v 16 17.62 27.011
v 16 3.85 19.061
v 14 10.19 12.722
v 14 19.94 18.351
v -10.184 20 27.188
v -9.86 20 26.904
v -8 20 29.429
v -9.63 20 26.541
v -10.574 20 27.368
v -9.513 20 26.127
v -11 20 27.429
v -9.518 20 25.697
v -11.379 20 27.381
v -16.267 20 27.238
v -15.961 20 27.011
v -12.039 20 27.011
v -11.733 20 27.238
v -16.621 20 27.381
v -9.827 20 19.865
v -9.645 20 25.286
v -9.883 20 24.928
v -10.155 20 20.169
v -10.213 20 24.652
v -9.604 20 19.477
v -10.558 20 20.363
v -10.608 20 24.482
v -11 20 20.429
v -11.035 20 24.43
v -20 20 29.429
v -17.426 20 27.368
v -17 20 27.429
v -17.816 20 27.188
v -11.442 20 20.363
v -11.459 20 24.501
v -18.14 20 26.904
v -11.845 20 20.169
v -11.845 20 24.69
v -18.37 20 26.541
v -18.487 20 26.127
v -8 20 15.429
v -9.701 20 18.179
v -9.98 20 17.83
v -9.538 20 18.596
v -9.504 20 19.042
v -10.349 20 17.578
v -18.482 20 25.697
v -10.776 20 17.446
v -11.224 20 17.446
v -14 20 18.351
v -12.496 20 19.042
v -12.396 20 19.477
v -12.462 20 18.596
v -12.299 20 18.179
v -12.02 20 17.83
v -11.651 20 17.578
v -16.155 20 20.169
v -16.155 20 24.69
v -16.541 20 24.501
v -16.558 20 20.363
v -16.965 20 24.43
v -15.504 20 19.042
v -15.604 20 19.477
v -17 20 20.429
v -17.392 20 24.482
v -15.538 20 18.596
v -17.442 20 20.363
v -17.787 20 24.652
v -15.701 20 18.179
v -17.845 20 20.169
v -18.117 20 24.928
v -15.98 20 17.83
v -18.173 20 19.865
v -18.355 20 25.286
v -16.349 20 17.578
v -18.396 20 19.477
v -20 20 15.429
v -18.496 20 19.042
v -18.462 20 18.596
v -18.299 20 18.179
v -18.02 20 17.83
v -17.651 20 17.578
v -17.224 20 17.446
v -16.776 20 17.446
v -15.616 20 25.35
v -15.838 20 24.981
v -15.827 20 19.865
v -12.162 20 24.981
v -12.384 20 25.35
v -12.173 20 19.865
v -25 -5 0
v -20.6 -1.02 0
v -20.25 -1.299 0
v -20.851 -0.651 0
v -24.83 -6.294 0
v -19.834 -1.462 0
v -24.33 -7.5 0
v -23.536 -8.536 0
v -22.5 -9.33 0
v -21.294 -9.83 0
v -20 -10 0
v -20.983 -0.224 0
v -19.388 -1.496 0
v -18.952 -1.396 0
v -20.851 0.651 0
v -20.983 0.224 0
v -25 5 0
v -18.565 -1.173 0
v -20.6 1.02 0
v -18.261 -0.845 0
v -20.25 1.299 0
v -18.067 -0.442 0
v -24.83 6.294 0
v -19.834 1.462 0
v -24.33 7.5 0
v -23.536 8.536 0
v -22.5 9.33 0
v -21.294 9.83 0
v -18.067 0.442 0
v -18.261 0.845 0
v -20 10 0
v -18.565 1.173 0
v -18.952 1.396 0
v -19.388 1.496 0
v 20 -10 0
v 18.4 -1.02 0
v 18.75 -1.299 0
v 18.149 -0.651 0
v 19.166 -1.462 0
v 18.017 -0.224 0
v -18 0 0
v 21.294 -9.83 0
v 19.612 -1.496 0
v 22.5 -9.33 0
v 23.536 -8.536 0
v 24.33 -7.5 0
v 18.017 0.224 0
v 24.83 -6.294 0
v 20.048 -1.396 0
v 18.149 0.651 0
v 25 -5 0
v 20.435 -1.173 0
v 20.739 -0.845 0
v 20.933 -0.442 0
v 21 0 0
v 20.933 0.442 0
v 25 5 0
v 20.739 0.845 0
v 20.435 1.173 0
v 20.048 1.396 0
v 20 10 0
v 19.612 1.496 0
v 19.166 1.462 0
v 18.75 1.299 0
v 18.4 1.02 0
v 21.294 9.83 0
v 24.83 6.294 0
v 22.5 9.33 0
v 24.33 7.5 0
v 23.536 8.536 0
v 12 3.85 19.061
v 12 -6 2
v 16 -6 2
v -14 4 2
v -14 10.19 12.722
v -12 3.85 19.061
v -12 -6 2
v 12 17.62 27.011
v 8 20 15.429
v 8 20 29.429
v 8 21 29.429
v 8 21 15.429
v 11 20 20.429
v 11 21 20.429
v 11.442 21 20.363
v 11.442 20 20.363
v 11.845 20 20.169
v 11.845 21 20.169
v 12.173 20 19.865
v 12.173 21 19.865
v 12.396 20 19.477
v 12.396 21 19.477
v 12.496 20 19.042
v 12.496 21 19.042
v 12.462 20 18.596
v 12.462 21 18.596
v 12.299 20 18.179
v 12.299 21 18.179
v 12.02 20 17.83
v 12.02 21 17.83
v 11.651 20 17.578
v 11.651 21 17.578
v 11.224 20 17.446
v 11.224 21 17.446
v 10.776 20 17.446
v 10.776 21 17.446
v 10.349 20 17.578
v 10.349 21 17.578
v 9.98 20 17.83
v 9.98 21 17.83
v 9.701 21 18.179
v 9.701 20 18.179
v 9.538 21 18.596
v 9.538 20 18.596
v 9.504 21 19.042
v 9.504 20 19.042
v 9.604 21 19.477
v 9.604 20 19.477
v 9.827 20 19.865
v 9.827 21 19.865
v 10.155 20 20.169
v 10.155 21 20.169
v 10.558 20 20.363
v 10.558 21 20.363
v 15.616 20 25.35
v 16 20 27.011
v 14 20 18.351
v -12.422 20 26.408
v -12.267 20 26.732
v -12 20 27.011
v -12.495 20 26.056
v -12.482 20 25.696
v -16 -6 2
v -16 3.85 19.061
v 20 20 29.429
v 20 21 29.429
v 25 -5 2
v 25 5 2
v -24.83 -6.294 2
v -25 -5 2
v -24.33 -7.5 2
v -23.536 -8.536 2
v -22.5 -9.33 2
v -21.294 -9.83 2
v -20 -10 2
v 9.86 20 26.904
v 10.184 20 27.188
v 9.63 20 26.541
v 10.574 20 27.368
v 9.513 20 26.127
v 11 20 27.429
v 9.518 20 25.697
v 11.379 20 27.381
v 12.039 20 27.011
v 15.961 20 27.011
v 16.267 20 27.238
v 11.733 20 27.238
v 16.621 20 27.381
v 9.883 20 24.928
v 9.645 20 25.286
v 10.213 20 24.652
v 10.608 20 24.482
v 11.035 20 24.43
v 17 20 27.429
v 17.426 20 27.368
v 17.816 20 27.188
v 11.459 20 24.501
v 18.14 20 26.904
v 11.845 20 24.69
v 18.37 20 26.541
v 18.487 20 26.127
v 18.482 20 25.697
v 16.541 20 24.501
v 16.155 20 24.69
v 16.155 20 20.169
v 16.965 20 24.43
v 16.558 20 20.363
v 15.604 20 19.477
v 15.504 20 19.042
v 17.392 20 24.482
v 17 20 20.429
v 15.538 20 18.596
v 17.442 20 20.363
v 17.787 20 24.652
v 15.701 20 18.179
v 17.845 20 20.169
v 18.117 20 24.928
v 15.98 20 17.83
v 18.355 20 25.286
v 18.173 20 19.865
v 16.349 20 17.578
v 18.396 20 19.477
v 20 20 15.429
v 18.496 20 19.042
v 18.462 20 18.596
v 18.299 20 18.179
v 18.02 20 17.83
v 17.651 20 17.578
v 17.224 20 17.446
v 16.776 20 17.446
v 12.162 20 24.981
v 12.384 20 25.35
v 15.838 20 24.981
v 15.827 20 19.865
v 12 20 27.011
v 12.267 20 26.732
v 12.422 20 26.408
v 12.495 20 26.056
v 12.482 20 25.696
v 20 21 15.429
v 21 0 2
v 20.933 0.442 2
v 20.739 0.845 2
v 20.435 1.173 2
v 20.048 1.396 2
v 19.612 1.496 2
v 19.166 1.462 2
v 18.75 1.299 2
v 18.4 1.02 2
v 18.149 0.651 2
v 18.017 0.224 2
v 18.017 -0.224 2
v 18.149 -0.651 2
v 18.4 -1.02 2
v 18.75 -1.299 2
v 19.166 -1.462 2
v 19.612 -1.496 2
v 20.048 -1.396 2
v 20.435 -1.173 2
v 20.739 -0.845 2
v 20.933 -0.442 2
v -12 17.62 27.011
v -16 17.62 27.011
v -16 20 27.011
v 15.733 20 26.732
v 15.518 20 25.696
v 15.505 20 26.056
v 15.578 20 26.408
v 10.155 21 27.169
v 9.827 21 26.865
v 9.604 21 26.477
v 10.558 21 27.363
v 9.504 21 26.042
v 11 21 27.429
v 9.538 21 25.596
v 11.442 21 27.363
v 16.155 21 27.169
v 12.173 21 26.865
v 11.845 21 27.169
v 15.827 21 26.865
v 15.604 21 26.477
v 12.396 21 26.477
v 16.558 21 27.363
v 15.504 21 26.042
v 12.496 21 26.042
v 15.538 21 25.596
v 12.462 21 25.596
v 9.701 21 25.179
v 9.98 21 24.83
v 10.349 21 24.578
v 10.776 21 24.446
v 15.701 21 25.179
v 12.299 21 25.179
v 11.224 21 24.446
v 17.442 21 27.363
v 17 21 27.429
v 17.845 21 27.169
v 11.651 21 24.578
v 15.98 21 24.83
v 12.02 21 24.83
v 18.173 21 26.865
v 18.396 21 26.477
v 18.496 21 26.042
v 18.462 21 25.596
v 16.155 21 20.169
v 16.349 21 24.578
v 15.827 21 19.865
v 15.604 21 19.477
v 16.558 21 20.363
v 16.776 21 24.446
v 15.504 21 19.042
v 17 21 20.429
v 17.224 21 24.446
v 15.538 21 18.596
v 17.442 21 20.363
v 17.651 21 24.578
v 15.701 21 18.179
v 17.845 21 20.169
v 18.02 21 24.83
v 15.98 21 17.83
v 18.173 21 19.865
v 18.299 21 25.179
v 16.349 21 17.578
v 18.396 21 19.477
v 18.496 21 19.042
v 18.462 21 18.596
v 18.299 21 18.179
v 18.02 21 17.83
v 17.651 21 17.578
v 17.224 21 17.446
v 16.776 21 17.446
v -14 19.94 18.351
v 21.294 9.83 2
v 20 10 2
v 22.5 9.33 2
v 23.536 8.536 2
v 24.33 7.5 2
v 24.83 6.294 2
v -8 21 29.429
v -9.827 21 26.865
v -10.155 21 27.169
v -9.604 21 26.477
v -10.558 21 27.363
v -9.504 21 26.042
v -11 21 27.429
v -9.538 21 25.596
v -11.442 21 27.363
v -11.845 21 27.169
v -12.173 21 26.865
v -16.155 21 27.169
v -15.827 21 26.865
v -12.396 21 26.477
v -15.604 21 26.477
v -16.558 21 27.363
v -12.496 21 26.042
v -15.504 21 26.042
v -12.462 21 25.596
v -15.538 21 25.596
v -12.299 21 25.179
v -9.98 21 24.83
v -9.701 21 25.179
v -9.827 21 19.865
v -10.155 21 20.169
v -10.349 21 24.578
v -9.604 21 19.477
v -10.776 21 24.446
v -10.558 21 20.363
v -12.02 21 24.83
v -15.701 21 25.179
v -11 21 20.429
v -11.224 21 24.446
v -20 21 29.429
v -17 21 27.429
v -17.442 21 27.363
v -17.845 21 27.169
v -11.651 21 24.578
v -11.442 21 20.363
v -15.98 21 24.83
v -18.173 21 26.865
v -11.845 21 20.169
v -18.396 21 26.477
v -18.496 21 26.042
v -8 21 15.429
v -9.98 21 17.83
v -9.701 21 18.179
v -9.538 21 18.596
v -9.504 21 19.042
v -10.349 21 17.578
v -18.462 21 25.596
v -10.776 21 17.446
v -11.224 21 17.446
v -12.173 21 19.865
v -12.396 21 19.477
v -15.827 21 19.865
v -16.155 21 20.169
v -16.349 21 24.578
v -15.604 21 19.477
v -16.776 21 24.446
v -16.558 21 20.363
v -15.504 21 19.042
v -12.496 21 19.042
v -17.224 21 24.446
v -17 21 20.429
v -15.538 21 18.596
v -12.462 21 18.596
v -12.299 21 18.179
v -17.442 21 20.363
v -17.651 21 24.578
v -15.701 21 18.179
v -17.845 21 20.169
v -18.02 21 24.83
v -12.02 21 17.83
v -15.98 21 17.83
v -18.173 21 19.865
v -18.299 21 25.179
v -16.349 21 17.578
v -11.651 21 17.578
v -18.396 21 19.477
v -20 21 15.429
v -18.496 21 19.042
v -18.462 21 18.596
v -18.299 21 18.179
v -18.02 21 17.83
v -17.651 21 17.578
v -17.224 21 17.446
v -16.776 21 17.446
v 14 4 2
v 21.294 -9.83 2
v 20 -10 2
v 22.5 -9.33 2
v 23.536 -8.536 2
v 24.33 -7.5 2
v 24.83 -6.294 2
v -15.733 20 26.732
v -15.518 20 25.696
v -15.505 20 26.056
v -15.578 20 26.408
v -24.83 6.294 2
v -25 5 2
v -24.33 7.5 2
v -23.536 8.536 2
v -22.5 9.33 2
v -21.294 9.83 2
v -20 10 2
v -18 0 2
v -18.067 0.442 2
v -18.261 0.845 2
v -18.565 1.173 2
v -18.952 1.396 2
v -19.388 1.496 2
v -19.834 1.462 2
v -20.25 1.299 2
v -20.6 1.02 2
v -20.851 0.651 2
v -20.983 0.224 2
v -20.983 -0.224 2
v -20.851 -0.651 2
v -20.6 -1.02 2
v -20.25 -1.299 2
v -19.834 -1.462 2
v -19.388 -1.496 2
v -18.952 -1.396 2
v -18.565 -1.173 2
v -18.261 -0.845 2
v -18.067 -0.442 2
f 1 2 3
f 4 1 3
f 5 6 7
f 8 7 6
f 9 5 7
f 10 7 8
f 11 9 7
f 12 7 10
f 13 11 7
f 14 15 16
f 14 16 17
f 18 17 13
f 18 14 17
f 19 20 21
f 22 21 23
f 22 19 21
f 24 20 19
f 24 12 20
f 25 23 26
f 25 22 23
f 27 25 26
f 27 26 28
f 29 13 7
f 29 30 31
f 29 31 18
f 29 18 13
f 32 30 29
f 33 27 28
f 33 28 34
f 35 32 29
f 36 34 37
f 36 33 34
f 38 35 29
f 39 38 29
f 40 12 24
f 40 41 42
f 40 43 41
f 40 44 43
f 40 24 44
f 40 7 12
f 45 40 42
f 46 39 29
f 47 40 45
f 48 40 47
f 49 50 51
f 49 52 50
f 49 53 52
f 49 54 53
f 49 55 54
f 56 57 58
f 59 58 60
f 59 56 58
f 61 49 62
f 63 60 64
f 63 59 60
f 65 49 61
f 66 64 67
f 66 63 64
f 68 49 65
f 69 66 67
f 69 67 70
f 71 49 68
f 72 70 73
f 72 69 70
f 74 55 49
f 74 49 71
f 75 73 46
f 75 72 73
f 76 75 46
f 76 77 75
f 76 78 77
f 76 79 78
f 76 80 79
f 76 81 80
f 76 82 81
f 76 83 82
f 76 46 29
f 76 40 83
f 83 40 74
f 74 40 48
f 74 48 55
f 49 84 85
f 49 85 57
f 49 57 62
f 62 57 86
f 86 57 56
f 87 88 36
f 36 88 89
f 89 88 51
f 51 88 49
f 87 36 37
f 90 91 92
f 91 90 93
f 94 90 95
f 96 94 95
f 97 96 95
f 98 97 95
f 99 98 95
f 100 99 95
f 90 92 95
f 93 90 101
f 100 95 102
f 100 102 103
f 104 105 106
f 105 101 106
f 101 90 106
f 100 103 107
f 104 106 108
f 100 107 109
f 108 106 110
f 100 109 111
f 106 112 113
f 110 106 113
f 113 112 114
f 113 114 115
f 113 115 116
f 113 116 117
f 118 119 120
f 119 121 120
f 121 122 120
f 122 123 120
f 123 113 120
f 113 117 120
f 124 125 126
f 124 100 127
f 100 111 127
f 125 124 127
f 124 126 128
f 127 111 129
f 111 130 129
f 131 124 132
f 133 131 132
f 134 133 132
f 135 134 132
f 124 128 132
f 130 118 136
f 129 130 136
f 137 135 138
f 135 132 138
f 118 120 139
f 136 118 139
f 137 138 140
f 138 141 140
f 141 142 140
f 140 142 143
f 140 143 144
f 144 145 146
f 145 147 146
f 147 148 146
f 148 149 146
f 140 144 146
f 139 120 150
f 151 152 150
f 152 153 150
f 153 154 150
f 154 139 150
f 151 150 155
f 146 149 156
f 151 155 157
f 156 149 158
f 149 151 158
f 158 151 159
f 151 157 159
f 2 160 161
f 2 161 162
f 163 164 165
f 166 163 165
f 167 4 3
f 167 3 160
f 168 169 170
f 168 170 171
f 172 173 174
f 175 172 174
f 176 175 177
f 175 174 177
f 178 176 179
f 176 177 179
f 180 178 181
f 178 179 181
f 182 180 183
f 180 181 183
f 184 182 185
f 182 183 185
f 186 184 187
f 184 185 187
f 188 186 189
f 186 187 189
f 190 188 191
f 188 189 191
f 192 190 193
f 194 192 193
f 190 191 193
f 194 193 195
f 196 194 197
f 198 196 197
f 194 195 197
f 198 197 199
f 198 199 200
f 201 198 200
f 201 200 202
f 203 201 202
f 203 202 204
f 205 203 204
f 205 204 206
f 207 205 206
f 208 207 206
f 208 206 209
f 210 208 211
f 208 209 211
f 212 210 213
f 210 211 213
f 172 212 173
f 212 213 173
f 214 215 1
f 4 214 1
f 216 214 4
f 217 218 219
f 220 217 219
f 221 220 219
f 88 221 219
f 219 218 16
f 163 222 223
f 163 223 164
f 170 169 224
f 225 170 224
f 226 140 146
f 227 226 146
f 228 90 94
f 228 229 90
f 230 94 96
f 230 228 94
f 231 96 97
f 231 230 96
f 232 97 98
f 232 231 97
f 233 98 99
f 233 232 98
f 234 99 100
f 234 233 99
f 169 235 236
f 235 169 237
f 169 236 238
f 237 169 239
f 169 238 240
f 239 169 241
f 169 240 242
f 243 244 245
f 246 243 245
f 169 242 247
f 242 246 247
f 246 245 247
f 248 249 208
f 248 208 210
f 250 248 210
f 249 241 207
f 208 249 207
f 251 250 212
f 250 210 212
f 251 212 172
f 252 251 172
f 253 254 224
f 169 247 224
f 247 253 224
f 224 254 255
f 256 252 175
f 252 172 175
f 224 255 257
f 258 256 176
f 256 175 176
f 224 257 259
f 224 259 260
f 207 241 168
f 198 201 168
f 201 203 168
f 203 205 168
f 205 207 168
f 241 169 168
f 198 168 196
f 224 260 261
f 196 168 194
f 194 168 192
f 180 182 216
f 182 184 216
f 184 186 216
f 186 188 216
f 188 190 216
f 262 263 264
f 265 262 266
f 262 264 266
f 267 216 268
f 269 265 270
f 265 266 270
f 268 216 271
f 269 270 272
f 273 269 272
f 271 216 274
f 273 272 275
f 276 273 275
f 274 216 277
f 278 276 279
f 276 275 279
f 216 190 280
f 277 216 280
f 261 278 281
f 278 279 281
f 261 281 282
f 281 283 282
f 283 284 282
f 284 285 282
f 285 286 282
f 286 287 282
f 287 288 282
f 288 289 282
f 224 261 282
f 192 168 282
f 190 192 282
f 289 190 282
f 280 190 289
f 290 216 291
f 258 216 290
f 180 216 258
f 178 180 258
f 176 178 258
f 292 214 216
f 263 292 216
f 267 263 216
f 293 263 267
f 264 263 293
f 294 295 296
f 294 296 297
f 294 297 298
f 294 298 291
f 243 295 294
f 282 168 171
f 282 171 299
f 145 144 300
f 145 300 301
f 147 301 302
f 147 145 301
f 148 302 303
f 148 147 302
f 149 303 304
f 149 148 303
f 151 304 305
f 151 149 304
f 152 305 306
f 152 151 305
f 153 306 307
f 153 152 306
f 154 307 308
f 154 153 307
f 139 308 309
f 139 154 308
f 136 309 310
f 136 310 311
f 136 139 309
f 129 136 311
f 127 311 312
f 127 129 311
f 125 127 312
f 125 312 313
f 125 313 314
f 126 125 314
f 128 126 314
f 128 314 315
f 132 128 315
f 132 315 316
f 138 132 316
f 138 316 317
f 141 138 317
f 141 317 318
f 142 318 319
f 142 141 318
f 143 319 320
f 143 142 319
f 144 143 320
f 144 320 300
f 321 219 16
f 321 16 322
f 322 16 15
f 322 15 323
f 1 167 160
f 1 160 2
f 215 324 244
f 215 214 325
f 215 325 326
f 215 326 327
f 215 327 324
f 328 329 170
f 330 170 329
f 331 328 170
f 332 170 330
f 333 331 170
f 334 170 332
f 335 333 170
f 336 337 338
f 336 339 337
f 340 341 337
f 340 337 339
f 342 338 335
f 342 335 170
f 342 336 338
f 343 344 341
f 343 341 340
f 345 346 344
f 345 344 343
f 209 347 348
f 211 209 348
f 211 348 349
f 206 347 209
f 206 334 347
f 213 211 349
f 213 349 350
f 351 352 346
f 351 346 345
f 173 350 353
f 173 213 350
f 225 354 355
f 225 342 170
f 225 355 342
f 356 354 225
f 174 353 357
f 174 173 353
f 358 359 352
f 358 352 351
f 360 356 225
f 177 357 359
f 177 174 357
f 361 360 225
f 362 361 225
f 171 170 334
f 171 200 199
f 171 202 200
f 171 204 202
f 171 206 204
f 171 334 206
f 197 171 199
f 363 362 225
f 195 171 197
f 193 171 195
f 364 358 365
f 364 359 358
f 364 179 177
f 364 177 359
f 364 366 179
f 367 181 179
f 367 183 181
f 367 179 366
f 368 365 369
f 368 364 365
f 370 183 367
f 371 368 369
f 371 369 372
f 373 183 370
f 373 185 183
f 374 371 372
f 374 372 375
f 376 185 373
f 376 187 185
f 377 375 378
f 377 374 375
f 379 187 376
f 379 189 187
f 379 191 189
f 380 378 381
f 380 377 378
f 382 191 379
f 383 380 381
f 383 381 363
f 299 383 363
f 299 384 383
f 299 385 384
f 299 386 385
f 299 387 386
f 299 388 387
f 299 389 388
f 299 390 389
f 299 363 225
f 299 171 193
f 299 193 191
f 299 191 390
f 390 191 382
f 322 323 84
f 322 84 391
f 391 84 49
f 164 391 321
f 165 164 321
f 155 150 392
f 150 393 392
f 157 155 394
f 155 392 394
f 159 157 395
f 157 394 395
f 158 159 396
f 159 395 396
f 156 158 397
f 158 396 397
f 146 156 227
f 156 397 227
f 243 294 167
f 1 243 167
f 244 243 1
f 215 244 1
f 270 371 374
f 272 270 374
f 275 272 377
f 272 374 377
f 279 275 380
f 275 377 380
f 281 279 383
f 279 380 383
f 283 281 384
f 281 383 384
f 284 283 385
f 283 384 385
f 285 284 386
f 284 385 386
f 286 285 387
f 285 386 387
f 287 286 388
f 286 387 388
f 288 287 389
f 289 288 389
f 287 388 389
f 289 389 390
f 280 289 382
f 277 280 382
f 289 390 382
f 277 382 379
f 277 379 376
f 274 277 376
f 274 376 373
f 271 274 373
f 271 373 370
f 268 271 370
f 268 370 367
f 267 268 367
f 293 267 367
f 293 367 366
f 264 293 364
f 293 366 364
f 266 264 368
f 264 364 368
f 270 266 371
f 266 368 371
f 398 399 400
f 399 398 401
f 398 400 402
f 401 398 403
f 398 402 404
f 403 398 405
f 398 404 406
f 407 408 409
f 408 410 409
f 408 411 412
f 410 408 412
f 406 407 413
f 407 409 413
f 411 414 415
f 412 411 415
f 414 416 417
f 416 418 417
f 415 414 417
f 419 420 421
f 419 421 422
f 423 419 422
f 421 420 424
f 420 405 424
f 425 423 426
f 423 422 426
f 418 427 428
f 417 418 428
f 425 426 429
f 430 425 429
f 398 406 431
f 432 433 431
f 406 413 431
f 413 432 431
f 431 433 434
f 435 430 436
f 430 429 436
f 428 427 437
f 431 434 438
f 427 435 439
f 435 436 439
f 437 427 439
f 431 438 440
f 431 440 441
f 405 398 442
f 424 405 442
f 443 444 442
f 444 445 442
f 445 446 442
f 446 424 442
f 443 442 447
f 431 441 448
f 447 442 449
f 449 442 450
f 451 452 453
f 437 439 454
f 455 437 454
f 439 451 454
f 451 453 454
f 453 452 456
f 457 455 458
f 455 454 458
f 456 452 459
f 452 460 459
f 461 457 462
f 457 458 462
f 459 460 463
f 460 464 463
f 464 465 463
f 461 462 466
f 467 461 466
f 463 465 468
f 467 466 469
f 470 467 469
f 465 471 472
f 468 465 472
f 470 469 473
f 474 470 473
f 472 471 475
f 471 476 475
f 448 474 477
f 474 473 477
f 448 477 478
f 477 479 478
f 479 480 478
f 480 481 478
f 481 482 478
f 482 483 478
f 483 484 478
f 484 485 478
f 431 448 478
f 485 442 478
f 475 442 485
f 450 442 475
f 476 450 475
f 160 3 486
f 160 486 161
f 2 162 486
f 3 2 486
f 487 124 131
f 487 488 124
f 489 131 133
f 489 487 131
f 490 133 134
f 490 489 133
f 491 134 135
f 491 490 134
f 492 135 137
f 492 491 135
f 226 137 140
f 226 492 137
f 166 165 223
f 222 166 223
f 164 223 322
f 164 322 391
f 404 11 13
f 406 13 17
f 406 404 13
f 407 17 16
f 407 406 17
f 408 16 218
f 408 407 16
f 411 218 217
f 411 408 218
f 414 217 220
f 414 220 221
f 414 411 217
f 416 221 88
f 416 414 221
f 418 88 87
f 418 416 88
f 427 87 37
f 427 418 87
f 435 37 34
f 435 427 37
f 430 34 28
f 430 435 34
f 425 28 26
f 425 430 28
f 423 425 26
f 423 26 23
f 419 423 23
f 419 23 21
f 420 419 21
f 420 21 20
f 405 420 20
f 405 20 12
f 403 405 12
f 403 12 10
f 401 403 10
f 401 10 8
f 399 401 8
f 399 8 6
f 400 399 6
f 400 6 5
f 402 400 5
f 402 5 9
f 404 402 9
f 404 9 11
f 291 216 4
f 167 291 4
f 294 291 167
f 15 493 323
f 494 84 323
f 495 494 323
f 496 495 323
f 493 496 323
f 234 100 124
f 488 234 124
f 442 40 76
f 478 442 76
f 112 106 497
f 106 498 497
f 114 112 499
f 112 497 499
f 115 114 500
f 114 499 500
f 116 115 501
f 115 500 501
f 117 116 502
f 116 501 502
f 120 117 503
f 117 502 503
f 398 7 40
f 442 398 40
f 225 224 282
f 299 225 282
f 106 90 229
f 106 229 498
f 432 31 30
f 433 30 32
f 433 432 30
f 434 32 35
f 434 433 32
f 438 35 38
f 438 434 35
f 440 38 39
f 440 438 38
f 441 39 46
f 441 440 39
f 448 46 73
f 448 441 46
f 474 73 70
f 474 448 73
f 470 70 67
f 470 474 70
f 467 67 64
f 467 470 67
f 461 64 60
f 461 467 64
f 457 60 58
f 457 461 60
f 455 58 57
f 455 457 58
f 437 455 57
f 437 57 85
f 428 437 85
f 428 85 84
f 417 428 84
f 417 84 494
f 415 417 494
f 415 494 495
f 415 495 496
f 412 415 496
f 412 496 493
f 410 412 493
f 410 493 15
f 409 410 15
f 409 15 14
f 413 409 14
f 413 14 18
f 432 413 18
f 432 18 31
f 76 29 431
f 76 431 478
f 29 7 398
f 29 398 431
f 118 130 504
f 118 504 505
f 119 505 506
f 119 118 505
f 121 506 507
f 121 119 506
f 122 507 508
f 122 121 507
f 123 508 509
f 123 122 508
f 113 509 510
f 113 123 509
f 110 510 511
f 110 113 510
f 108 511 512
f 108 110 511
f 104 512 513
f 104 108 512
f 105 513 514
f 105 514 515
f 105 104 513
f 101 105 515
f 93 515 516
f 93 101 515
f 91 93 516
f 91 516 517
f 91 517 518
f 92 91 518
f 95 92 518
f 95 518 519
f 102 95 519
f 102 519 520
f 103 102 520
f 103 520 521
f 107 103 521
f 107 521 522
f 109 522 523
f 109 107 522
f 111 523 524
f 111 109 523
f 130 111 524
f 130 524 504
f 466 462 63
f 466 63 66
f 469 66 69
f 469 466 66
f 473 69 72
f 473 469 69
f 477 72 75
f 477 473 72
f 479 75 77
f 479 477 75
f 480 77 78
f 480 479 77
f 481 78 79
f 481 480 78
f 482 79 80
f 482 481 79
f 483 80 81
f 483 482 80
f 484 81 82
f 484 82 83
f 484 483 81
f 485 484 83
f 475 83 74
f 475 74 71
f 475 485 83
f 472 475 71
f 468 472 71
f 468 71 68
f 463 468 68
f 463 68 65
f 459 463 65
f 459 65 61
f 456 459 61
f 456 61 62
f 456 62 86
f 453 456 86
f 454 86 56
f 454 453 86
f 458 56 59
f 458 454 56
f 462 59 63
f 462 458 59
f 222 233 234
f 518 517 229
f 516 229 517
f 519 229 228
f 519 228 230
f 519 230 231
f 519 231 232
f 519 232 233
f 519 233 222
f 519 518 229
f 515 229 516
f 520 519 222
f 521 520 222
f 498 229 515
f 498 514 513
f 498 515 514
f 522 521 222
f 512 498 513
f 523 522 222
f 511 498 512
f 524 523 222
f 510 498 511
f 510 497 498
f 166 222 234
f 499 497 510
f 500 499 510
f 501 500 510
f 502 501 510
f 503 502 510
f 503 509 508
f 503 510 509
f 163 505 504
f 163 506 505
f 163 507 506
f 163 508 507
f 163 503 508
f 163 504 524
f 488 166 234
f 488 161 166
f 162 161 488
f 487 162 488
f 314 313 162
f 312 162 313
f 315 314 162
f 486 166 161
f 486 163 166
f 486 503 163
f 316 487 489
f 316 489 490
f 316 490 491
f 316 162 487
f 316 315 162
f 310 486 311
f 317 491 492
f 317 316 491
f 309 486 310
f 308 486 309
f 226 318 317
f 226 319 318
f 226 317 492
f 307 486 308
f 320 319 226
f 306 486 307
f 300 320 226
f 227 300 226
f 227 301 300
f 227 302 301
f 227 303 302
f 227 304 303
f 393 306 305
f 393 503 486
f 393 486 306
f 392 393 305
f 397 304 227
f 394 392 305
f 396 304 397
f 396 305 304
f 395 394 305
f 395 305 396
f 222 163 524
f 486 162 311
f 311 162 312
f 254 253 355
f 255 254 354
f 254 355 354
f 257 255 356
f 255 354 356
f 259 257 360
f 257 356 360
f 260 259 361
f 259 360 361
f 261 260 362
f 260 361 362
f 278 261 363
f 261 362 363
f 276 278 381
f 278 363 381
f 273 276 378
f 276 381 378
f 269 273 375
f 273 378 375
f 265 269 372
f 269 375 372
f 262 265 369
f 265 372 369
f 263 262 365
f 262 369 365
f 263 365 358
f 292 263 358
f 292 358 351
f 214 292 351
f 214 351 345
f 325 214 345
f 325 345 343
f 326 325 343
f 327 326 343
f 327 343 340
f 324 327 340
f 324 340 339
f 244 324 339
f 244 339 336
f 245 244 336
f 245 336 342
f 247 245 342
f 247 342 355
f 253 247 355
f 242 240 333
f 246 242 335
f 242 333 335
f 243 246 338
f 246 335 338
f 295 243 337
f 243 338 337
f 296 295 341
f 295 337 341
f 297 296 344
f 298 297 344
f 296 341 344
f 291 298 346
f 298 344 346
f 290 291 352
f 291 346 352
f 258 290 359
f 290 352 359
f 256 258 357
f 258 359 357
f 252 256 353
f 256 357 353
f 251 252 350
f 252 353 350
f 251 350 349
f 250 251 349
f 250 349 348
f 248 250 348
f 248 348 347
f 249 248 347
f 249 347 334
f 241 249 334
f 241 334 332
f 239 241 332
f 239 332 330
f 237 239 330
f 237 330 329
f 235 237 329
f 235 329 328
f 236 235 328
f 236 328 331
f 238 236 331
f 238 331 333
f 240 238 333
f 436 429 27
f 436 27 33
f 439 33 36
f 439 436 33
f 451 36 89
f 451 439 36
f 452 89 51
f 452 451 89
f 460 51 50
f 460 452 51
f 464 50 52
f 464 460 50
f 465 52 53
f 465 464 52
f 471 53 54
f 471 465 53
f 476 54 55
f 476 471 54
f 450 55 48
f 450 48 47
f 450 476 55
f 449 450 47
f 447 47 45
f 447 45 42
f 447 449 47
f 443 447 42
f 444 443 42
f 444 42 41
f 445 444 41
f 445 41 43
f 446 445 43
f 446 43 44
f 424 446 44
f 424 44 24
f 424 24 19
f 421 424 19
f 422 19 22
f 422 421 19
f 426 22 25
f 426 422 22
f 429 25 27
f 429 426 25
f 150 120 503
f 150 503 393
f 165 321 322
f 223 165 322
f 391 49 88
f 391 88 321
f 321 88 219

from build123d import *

# Parameters (mm, degrees)
SKETCH_1_W          = 50
SKETCH_1_H          = 20
SKETCH_1_R          = 1.5
EXTRUDE_1_DEPTH     = 2
FILLET_1_R          = 5
SKETCH_7_W          = 4
SKETCH_7_H          = 17.320508076
CUT_EXTRUDE_1_DEPTH = 8
SKETCH_9_W          = 12
SKETCH_9_H          = 14
EXTRUDE_3_DEPTH     = 1
SKETCH_10_R         = 1.5
CUT_EXTRUDE_2_DEPTH = 1


with BuildPart() as part:
    # 草图1 → 凸台-拉伸1 (new body)
    with BuildSketch(Plane.XY):
        Rectangle(SKETCH_1_W, SKETCH_1_H)
        with Locations((-19.5, 0)):
            Circle(SKETCH_1_R, mode=Mode.SUBTRACT)
        with Locations((19.5, 0)):
            Circle(SKETCH_1_R, mode=Mode.SUBTRACT)
    extrude(amount=EXTRUDE_1_DEPTH)

    # 圆角1
    fillet_1_edges = [part.edges().sort_by_distance(p)[0] for p in [
        (25, -10, 1),
        (-25, -10, 1),
        (-25, 10, 1),
        (25, 10, 1),
    ]]
    fillet(fillet_1_edges, radius=FILLET_1_R)

    # 扫描1: sweep along a path in 草图6
    with BuildLine(Plane(origin=(14, 0, 0), x_dir=(0, 0, -1), z_dir=(1, 0, 0))) as sweep_1_path:
        Line((-2, -4.360392195), (-18.021958635, 4.889889936))
        Line((-18.021958635, 4.889889936), (-25.591084209, 18))
        Line((-25.591084209, 18), (-25.591084209, 22))
    # 草图2 → 扫描1 (sweep)
    with BuildSketch(Plane.XY.offset(2)):
        Polygon((14, 4), (12, -6), (16, -6), align=None)
    sweep_1 = sweep(path=sweep_1_path.line, transition=Transition.RIGHT)

    # 草图7 → 切除-拉伸1 (cut)
    with BuildSketch(Plane(origin=(0, 20, 0), x_dir=(1, 0, 0), z_dir=(0, 1, 0))):
        with Locations((14, -18.350772183)):
            Rectangle(SKETCH_7_W, SKETCH_7_H)
    cut_extrude_1 = extrude(amount=CUT_EXTRUDE_1_DEPTH, mode=Mode.SUBTRACT)

    # 草图9 → 凸台-拉伸3 (add)
    with BuildSketch(Plane(origin=(0, 20, 0), x_dir=(1, 0, 0), z_dir=(0, 1, 0))):
        with Locations((14, -22.429425186)):
            Rectangle(SKETCH_9_W, SKETCH_9_H)
    extrude_3 = extrude(amount=EXTRUDE_3_DEPTH)

    # 草图10 → 切除-拉伸2 (cut)
    with BuildSketch(Plane(origin=(0, 21, 0), x_dir=(1, 0, 0), z_dir=(0, 1, 0))):
        with Locations(Location((11, -25.929425186, 0), (0, 0, 270))):
            Circle(SKETCH_10_R)
        with Locations(Location((17, -18.929425186, 0), (0, 0, 270))):
            Circle(SKETCH_10_R)
        with Locations(Location((11, -18.929425186, 0), (0, 0, 270))):
            Circle(SKETCH_10_R)
        with Locations(Location((17, -25.929425186, 0), (0, 0, 270))):
            Circle(SKETCH_10_R)
    cut_extrude_2 = extrude(amount=-CUT_EXTRUDE_2_DEPTH, mode=Mode.SUBTRACT)

    # 镜向1: 扫描1, 切除-拉伸1, 凸台-拉伸3, 切除-拉伸2 across plane
    add(sweep_1.mirror(Plane(origin=(0, 0, 0), x_dir=(0, 0, 1), z_dir=(1, 0, 0))))
    add(cut_extrude_1.mirror(Plane(origin=(0, 0, 0), x_dir=(0, 0, 1), z_dir=(1, 0, 0))), mode=Mode.SUBTRACT)
    add(extrude_3.mirror(Plane(origin=(0, 0, 0), x_dir=(0, 0, 1), z_dir=(1, 0, 0))))
    add(cut_extrude_2.mirror(Plane(origin=(0, 0, 0), x_dir=(0, 0, 1), z_dir=(1, 0, 0))), mode=Mode.SUBTRACT)


solid = part.part
